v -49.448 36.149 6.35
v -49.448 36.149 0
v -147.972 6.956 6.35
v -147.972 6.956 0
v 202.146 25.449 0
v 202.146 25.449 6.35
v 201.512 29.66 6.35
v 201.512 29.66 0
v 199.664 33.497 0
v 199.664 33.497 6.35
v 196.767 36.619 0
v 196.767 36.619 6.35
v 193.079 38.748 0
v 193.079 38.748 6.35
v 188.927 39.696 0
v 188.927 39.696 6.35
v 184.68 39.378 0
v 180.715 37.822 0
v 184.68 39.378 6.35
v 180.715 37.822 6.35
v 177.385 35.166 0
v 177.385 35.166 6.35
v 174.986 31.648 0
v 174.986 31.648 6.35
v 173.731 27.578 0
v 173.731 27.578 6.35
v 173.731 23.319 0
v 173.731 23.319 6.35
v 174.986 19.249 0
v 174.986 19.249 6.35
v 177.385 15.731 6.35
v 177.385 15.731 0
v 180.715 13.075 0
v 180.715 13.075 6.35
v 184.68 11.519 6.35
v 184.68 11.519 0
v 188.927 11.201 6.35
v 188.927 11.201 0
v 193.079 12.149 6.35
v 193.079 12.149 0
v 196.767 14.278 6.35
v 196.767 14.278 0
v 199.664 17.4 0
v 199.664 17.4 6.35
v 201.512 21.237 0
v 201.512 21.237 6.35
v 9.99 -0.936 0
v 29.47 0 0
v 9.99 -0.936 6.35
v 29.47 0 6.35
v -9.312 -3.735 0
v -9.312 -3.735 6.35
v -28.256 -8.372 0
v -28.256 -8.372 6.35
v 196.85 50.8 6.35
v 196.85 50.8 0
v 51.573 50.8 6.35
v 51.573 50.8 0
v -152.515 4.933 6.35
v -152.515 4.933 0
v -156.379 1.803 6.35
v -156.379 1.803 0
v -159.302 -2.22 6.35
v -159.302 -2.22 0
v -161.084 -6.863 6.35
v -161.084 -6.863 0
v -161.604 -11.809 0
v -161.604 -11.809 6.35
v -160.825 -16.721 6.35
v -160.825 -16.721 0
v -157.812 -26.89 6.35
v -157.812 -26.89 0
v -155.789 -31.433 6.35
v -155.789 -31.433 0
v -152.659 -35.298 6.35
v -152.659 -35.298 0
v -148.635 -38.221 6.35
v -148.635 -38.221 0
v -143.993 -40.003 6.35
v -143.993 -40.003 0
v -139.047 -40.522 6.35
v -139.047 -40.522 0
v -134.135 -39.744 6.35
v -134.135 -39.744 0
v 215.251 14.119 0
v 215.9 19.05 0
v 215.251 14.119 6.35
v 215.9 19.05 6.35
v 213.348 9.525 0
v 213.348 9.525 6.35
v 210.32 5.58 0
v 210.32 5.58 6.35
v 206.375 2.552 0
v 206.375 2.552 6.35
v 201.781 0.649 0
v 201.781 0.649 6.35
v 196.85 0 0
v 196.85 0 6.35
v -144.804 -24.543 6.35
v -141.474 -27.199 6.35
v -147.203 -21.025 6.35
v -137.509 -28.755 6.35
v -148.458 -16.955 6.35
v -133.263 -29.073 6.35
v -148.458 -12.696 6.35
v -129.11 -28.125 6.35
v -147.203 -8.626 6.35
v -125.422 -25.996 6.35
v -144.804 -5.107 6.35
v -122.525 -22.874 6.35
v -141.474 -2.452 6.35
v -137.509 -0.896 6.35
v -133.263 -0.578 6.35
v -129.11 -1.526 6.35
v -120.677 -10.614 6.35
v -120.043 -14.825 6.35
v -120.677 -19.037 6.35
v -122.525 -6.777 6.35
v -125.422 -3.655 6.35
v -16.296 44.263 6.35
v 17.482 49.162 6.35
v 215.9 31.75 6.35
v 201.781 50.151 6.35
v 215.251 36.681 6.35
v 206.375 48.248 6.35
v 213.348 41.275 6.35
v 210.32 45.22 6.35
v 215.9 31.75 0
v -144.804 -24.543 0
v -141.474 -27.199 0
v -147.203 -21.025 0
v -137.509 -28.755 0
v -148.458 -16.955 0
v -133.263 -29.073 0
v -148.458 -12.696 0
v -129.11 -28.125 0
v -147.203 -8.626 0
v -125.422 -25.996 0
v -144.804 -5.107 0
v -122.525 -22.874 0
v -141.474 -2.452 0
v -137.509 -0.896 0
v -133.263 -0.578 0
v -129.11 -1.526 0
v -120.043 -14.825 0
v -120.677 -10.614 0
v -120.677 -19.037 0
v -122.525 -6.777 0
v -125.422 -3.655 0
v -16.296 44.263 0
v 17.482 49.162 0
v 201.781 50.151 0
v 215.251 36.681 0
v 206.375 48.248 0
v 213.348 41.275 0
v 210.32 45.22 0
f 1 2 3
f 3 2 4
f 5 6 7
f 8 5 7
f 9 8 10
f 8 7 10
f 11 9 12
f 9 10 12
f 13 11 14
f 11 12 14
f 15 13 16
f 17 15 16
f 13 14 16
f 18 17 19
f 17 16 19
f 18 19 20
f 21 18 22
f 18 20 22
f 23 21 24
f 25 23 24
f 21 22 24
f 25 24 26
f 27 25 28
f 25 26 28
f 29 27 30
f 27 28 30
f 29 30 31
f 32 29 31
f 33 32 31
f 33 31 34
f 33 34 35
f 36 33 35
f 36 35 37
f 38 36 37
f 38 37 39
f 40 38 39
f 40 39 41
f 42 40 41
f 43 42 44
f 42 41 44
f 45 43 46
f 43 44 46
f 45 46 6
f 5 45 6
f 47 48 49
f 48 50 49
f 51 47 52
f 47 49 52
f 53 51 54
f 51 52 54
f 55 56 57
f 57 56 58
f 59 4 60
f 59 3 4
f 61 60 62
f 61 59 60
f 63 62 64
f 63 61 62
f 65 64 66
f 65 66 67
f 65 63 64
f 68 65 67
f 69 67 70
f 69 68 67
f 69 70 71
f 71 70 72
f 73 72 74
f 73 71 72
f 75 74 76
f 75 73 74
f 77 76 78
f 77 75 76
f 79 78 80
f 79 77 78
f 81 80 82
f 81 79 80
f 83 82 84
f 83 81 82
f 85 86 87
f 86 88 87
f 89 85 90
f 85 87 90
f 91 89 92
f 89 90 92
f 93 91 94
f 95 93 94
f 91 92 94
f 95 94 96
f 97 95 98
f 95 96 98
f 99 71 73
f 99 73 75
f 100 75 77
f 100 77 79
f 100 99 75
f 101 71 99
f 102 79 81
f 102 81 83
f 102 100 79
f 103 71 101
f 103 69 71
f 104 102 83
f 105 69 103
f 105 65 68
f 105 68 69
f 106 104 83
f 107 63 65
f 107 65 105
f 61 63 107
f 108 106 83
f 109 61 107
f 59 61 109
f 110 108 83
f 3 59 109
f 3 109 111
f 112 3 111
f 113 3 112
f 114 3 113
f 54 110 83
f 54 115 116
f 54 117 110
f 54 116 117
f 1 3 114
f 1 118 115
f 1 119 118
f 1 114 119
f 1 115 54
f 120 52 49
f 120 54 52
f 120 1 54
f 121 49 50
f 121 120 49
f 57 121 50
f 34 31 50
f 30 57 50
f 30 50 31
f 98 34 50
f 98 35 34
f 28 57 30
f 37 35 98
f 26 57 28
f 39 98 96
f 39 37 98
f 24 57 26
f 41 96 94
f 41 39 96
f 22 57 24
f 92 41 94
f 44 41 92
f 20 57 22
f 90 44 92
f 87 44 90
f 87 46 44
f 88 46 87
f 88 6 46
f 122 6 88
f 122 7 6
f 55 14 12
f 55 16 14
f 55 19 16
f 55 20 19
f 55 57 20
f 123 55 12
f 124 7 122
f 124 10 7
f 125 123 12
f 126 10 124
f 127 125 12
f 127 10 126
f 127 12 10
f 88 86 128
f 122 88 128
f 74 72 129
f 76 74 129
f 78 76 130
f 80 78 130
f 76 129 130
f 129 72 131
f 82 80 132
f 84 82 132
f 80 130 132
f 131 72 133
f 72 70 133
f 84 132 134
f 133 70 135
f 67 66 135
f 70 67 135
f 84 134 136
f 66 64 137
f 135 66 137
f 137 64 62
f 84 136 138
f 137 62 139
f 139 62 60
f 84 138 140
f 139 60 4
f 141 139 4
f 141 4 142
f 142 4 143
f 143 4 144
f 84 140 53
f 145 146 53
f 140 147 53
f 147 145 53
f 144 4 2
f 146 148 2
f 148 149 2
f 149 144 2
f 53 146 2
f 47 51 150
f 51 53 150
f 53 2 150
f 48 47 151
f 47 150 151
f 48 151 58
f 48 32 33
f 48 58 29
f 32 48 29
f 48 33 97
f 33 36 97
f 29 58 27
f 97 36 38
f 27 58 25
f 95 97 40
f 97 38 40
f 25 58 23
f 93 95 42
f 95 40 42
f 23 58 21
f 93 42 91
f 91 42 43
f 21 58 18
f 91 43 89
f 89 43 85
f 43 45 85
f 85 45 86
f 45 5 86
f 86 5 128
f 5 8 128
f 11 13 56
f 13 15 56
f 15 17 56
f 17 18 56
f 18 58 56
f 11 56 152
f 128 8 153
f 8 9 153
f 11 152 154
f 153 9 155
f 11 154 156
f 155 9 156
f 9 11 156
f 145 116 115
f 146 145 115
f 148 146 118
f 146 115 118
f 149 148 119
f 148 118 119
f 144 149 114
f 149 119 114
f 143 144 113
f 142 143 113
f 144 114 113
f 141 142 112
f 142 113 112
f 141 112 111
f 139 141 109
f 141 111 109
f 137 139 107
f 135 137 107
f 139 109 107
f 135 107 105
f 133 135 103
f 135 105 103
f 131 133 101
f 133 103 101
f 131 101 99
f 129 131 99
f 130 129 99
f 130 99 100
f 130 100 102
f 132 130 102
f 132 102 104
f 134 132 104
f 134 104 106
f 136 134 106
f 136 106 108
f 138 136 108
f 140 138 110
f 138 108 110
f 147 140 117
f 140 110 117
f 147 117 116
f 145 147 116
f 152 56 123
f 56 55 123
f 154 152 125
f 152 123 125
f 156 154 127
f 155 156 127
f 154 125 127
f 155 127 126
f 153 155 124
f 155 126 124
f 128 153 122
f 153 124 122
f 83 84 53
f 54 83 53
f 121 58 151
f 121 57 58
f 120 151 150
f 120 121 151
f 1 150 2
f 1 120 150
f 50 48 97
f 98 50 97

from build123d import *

# Parameters (mm, degrees)
BOSS_EXTRUDE1_DEPTH = 6.35
FILLET1_R           = 203.2
FILLET2_R           = 355.6
FILLET3_R           = 19.05
FILLET4_R           = 19.05
FILLET5_R           = 19.05
FILLET6_R           = 19.05
SKETCH2_R           = 14.2875
CUT_EXTRUDE1_DEPTH  = 6.35


with BuildPart() as part:
    # Sketch1 → Boss-Extrude1 (new body)
    with BuildSketch(Plane.XY):
        Polygon((0, 0), (215.9, 0), (215.9, 50.8), (0, 50.8), (-166.237074401, 1.544570548), (-152.4, -45.155555556), align=None)
    extrude(amount=BOSS_EXTRUDE1_DEPTH)

    # Fillet1
    fillet1_edges = [part.edges().sort_by_distance(p)[0] for p in [
        (0, 0, 3.175),
    ]]
    fillet(fillet1_edges, radius=FILLET1_R)

    # Fillet2
    fillet2_edges = [part.edges().sort_by_distance(p)[0] for p in [
        (0, 50.8, 3.175),
    ]]
    fillet(fillet2_edges, radius=FILLET2_R)

    # Fillet3
    fillet3_edges = [part.edges().sort_by_distance(p)[0] for p in [
        (-166.237074401, 1.544570548, 3.175),
    ]]
    fillet(fillet3_edges, radius=FILLET3_R)

    # Fillet4
    fillet4_edges = [part.edges().sort_by_distance(p)[0] for p in [
        (-152.4, -45.155555556, 3.175),
    ]]
    fillet(fillet4_edges, radius=FILLET4_R)

    # Fillet5
    fillet5_edges = [part.edges().sort_by_distance(p)[0] for p in [
        (215.9, 50.8, 3.175),
    ]]
    fillet(fillet5_edges, radius=FILLET5_R)

    # Fillet6
    fillet6_edges = [part.edges().sort_by_distance(p)[0] for p in [
        (215.9, 0, 3.175),
    ]]
    fillet(fillet6_edges, radius=FILLET6_R)

    # Sketch2 → Cut-Extrude1 (cut)
    with BuildSketch(Plane.XY.offset(6.35)):
        with Locations((-134.33022138, -14.825444286)):
            Circle(SKETCH2_R)
        with Locations((187.858901067, 25.448520628)):
            Circle(SKETCH2_R)
    extrude(amount=-CUT_EXTRUDE1_DEPTH, mode=Mode.SUBTRACT)


solid = part.part
